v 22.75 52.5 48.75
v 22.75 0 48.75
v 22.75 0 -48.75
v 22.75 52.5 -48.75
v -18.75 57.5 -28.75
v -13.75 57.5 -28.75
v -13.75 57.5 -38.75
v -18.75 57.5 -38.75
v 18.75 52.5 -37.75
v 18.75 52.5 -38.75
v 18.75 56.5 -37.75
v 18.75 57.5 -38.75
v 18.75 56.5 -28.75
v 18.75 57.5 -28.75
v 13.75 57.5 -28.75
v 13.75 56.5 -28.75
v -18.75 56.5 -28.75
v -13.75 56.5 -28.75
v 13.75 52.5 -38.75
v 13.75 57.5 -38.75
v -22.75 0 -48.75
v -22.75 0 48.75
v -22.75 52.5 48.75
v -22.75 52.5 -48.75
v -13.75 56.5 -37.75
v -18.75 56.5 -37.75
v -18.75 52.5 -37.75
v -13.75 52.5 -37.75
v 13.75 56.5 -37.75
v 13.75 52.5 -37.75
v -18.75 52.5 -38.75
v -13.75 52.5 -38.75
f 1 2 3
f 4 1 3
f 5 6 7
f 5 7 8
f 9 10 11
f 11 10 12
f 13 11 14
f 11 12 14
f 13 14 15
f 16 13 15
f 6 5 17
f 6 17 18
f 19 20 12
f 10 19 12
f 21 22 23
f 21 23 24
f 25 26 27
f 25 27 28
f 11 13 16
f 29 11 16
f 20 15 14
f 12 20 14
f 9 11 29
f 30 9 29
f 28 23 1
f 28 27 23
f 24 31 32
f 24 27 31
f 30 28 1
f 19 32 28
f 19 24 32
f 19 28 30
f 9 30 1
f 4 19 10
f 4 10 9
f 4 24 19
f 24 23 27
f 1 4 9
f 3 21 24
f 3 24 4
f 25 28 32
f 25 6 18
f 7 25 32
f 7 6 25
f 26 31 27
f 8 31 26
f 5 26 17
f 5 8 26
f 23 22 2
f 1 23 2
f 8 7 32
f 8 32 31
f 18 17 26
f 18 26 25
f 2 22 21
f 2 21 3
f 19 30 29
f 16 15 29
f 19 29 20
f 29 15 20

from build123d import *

# Parameters (mm, degrees)
SKETCH_1_W      = 45.5
SKETCH_1_H      = 97.5
EXTRUDE_1_DEPTH = 52.5
SKETCH_3_W      = 5
SKETCH_3_H      = 1


with BuildPart() as part:
    # 草图1 → 拉伸1 (new body)
    with BuildSketch(Plane(origin=(0, 0, 0), x_dir=(1, 0, 0), z_dir=(0, 1, 0))):
        Rectangle(SKETCH_1_W, SKETCH_1_H)
    extrude(amount=EXTRUDE_1_DEPTH)

    # 扫描1: sweep along a path in 草图4
    with BuildLine(Plane.ZY.offset(18.75)) as sweep_1_path:
        Line((-38.75, 52.5), (-38.75, 57.5))
        Line((-38.75, 57.5), (-28.75, 57.5))
    # 草图3 → 扫描1 (sweep)
    with BuildSketch(Plane(origin=(0, 52.5, 0), x_dir=(-1, 0, 0), z_dir=(0, 1, 0))):
        with Locations((16.25, -38.25)):
            Rectangle(SKETCH_3_W, SKETCH_3_H)
    sweep_1 = sweep(path=sweep_1_path.line, transition=Transition.RIGHT)

    # 镜向2: 扫描1 across plane
    add(sweep_1.mirror(Plane.ZY))


solid = part.part
